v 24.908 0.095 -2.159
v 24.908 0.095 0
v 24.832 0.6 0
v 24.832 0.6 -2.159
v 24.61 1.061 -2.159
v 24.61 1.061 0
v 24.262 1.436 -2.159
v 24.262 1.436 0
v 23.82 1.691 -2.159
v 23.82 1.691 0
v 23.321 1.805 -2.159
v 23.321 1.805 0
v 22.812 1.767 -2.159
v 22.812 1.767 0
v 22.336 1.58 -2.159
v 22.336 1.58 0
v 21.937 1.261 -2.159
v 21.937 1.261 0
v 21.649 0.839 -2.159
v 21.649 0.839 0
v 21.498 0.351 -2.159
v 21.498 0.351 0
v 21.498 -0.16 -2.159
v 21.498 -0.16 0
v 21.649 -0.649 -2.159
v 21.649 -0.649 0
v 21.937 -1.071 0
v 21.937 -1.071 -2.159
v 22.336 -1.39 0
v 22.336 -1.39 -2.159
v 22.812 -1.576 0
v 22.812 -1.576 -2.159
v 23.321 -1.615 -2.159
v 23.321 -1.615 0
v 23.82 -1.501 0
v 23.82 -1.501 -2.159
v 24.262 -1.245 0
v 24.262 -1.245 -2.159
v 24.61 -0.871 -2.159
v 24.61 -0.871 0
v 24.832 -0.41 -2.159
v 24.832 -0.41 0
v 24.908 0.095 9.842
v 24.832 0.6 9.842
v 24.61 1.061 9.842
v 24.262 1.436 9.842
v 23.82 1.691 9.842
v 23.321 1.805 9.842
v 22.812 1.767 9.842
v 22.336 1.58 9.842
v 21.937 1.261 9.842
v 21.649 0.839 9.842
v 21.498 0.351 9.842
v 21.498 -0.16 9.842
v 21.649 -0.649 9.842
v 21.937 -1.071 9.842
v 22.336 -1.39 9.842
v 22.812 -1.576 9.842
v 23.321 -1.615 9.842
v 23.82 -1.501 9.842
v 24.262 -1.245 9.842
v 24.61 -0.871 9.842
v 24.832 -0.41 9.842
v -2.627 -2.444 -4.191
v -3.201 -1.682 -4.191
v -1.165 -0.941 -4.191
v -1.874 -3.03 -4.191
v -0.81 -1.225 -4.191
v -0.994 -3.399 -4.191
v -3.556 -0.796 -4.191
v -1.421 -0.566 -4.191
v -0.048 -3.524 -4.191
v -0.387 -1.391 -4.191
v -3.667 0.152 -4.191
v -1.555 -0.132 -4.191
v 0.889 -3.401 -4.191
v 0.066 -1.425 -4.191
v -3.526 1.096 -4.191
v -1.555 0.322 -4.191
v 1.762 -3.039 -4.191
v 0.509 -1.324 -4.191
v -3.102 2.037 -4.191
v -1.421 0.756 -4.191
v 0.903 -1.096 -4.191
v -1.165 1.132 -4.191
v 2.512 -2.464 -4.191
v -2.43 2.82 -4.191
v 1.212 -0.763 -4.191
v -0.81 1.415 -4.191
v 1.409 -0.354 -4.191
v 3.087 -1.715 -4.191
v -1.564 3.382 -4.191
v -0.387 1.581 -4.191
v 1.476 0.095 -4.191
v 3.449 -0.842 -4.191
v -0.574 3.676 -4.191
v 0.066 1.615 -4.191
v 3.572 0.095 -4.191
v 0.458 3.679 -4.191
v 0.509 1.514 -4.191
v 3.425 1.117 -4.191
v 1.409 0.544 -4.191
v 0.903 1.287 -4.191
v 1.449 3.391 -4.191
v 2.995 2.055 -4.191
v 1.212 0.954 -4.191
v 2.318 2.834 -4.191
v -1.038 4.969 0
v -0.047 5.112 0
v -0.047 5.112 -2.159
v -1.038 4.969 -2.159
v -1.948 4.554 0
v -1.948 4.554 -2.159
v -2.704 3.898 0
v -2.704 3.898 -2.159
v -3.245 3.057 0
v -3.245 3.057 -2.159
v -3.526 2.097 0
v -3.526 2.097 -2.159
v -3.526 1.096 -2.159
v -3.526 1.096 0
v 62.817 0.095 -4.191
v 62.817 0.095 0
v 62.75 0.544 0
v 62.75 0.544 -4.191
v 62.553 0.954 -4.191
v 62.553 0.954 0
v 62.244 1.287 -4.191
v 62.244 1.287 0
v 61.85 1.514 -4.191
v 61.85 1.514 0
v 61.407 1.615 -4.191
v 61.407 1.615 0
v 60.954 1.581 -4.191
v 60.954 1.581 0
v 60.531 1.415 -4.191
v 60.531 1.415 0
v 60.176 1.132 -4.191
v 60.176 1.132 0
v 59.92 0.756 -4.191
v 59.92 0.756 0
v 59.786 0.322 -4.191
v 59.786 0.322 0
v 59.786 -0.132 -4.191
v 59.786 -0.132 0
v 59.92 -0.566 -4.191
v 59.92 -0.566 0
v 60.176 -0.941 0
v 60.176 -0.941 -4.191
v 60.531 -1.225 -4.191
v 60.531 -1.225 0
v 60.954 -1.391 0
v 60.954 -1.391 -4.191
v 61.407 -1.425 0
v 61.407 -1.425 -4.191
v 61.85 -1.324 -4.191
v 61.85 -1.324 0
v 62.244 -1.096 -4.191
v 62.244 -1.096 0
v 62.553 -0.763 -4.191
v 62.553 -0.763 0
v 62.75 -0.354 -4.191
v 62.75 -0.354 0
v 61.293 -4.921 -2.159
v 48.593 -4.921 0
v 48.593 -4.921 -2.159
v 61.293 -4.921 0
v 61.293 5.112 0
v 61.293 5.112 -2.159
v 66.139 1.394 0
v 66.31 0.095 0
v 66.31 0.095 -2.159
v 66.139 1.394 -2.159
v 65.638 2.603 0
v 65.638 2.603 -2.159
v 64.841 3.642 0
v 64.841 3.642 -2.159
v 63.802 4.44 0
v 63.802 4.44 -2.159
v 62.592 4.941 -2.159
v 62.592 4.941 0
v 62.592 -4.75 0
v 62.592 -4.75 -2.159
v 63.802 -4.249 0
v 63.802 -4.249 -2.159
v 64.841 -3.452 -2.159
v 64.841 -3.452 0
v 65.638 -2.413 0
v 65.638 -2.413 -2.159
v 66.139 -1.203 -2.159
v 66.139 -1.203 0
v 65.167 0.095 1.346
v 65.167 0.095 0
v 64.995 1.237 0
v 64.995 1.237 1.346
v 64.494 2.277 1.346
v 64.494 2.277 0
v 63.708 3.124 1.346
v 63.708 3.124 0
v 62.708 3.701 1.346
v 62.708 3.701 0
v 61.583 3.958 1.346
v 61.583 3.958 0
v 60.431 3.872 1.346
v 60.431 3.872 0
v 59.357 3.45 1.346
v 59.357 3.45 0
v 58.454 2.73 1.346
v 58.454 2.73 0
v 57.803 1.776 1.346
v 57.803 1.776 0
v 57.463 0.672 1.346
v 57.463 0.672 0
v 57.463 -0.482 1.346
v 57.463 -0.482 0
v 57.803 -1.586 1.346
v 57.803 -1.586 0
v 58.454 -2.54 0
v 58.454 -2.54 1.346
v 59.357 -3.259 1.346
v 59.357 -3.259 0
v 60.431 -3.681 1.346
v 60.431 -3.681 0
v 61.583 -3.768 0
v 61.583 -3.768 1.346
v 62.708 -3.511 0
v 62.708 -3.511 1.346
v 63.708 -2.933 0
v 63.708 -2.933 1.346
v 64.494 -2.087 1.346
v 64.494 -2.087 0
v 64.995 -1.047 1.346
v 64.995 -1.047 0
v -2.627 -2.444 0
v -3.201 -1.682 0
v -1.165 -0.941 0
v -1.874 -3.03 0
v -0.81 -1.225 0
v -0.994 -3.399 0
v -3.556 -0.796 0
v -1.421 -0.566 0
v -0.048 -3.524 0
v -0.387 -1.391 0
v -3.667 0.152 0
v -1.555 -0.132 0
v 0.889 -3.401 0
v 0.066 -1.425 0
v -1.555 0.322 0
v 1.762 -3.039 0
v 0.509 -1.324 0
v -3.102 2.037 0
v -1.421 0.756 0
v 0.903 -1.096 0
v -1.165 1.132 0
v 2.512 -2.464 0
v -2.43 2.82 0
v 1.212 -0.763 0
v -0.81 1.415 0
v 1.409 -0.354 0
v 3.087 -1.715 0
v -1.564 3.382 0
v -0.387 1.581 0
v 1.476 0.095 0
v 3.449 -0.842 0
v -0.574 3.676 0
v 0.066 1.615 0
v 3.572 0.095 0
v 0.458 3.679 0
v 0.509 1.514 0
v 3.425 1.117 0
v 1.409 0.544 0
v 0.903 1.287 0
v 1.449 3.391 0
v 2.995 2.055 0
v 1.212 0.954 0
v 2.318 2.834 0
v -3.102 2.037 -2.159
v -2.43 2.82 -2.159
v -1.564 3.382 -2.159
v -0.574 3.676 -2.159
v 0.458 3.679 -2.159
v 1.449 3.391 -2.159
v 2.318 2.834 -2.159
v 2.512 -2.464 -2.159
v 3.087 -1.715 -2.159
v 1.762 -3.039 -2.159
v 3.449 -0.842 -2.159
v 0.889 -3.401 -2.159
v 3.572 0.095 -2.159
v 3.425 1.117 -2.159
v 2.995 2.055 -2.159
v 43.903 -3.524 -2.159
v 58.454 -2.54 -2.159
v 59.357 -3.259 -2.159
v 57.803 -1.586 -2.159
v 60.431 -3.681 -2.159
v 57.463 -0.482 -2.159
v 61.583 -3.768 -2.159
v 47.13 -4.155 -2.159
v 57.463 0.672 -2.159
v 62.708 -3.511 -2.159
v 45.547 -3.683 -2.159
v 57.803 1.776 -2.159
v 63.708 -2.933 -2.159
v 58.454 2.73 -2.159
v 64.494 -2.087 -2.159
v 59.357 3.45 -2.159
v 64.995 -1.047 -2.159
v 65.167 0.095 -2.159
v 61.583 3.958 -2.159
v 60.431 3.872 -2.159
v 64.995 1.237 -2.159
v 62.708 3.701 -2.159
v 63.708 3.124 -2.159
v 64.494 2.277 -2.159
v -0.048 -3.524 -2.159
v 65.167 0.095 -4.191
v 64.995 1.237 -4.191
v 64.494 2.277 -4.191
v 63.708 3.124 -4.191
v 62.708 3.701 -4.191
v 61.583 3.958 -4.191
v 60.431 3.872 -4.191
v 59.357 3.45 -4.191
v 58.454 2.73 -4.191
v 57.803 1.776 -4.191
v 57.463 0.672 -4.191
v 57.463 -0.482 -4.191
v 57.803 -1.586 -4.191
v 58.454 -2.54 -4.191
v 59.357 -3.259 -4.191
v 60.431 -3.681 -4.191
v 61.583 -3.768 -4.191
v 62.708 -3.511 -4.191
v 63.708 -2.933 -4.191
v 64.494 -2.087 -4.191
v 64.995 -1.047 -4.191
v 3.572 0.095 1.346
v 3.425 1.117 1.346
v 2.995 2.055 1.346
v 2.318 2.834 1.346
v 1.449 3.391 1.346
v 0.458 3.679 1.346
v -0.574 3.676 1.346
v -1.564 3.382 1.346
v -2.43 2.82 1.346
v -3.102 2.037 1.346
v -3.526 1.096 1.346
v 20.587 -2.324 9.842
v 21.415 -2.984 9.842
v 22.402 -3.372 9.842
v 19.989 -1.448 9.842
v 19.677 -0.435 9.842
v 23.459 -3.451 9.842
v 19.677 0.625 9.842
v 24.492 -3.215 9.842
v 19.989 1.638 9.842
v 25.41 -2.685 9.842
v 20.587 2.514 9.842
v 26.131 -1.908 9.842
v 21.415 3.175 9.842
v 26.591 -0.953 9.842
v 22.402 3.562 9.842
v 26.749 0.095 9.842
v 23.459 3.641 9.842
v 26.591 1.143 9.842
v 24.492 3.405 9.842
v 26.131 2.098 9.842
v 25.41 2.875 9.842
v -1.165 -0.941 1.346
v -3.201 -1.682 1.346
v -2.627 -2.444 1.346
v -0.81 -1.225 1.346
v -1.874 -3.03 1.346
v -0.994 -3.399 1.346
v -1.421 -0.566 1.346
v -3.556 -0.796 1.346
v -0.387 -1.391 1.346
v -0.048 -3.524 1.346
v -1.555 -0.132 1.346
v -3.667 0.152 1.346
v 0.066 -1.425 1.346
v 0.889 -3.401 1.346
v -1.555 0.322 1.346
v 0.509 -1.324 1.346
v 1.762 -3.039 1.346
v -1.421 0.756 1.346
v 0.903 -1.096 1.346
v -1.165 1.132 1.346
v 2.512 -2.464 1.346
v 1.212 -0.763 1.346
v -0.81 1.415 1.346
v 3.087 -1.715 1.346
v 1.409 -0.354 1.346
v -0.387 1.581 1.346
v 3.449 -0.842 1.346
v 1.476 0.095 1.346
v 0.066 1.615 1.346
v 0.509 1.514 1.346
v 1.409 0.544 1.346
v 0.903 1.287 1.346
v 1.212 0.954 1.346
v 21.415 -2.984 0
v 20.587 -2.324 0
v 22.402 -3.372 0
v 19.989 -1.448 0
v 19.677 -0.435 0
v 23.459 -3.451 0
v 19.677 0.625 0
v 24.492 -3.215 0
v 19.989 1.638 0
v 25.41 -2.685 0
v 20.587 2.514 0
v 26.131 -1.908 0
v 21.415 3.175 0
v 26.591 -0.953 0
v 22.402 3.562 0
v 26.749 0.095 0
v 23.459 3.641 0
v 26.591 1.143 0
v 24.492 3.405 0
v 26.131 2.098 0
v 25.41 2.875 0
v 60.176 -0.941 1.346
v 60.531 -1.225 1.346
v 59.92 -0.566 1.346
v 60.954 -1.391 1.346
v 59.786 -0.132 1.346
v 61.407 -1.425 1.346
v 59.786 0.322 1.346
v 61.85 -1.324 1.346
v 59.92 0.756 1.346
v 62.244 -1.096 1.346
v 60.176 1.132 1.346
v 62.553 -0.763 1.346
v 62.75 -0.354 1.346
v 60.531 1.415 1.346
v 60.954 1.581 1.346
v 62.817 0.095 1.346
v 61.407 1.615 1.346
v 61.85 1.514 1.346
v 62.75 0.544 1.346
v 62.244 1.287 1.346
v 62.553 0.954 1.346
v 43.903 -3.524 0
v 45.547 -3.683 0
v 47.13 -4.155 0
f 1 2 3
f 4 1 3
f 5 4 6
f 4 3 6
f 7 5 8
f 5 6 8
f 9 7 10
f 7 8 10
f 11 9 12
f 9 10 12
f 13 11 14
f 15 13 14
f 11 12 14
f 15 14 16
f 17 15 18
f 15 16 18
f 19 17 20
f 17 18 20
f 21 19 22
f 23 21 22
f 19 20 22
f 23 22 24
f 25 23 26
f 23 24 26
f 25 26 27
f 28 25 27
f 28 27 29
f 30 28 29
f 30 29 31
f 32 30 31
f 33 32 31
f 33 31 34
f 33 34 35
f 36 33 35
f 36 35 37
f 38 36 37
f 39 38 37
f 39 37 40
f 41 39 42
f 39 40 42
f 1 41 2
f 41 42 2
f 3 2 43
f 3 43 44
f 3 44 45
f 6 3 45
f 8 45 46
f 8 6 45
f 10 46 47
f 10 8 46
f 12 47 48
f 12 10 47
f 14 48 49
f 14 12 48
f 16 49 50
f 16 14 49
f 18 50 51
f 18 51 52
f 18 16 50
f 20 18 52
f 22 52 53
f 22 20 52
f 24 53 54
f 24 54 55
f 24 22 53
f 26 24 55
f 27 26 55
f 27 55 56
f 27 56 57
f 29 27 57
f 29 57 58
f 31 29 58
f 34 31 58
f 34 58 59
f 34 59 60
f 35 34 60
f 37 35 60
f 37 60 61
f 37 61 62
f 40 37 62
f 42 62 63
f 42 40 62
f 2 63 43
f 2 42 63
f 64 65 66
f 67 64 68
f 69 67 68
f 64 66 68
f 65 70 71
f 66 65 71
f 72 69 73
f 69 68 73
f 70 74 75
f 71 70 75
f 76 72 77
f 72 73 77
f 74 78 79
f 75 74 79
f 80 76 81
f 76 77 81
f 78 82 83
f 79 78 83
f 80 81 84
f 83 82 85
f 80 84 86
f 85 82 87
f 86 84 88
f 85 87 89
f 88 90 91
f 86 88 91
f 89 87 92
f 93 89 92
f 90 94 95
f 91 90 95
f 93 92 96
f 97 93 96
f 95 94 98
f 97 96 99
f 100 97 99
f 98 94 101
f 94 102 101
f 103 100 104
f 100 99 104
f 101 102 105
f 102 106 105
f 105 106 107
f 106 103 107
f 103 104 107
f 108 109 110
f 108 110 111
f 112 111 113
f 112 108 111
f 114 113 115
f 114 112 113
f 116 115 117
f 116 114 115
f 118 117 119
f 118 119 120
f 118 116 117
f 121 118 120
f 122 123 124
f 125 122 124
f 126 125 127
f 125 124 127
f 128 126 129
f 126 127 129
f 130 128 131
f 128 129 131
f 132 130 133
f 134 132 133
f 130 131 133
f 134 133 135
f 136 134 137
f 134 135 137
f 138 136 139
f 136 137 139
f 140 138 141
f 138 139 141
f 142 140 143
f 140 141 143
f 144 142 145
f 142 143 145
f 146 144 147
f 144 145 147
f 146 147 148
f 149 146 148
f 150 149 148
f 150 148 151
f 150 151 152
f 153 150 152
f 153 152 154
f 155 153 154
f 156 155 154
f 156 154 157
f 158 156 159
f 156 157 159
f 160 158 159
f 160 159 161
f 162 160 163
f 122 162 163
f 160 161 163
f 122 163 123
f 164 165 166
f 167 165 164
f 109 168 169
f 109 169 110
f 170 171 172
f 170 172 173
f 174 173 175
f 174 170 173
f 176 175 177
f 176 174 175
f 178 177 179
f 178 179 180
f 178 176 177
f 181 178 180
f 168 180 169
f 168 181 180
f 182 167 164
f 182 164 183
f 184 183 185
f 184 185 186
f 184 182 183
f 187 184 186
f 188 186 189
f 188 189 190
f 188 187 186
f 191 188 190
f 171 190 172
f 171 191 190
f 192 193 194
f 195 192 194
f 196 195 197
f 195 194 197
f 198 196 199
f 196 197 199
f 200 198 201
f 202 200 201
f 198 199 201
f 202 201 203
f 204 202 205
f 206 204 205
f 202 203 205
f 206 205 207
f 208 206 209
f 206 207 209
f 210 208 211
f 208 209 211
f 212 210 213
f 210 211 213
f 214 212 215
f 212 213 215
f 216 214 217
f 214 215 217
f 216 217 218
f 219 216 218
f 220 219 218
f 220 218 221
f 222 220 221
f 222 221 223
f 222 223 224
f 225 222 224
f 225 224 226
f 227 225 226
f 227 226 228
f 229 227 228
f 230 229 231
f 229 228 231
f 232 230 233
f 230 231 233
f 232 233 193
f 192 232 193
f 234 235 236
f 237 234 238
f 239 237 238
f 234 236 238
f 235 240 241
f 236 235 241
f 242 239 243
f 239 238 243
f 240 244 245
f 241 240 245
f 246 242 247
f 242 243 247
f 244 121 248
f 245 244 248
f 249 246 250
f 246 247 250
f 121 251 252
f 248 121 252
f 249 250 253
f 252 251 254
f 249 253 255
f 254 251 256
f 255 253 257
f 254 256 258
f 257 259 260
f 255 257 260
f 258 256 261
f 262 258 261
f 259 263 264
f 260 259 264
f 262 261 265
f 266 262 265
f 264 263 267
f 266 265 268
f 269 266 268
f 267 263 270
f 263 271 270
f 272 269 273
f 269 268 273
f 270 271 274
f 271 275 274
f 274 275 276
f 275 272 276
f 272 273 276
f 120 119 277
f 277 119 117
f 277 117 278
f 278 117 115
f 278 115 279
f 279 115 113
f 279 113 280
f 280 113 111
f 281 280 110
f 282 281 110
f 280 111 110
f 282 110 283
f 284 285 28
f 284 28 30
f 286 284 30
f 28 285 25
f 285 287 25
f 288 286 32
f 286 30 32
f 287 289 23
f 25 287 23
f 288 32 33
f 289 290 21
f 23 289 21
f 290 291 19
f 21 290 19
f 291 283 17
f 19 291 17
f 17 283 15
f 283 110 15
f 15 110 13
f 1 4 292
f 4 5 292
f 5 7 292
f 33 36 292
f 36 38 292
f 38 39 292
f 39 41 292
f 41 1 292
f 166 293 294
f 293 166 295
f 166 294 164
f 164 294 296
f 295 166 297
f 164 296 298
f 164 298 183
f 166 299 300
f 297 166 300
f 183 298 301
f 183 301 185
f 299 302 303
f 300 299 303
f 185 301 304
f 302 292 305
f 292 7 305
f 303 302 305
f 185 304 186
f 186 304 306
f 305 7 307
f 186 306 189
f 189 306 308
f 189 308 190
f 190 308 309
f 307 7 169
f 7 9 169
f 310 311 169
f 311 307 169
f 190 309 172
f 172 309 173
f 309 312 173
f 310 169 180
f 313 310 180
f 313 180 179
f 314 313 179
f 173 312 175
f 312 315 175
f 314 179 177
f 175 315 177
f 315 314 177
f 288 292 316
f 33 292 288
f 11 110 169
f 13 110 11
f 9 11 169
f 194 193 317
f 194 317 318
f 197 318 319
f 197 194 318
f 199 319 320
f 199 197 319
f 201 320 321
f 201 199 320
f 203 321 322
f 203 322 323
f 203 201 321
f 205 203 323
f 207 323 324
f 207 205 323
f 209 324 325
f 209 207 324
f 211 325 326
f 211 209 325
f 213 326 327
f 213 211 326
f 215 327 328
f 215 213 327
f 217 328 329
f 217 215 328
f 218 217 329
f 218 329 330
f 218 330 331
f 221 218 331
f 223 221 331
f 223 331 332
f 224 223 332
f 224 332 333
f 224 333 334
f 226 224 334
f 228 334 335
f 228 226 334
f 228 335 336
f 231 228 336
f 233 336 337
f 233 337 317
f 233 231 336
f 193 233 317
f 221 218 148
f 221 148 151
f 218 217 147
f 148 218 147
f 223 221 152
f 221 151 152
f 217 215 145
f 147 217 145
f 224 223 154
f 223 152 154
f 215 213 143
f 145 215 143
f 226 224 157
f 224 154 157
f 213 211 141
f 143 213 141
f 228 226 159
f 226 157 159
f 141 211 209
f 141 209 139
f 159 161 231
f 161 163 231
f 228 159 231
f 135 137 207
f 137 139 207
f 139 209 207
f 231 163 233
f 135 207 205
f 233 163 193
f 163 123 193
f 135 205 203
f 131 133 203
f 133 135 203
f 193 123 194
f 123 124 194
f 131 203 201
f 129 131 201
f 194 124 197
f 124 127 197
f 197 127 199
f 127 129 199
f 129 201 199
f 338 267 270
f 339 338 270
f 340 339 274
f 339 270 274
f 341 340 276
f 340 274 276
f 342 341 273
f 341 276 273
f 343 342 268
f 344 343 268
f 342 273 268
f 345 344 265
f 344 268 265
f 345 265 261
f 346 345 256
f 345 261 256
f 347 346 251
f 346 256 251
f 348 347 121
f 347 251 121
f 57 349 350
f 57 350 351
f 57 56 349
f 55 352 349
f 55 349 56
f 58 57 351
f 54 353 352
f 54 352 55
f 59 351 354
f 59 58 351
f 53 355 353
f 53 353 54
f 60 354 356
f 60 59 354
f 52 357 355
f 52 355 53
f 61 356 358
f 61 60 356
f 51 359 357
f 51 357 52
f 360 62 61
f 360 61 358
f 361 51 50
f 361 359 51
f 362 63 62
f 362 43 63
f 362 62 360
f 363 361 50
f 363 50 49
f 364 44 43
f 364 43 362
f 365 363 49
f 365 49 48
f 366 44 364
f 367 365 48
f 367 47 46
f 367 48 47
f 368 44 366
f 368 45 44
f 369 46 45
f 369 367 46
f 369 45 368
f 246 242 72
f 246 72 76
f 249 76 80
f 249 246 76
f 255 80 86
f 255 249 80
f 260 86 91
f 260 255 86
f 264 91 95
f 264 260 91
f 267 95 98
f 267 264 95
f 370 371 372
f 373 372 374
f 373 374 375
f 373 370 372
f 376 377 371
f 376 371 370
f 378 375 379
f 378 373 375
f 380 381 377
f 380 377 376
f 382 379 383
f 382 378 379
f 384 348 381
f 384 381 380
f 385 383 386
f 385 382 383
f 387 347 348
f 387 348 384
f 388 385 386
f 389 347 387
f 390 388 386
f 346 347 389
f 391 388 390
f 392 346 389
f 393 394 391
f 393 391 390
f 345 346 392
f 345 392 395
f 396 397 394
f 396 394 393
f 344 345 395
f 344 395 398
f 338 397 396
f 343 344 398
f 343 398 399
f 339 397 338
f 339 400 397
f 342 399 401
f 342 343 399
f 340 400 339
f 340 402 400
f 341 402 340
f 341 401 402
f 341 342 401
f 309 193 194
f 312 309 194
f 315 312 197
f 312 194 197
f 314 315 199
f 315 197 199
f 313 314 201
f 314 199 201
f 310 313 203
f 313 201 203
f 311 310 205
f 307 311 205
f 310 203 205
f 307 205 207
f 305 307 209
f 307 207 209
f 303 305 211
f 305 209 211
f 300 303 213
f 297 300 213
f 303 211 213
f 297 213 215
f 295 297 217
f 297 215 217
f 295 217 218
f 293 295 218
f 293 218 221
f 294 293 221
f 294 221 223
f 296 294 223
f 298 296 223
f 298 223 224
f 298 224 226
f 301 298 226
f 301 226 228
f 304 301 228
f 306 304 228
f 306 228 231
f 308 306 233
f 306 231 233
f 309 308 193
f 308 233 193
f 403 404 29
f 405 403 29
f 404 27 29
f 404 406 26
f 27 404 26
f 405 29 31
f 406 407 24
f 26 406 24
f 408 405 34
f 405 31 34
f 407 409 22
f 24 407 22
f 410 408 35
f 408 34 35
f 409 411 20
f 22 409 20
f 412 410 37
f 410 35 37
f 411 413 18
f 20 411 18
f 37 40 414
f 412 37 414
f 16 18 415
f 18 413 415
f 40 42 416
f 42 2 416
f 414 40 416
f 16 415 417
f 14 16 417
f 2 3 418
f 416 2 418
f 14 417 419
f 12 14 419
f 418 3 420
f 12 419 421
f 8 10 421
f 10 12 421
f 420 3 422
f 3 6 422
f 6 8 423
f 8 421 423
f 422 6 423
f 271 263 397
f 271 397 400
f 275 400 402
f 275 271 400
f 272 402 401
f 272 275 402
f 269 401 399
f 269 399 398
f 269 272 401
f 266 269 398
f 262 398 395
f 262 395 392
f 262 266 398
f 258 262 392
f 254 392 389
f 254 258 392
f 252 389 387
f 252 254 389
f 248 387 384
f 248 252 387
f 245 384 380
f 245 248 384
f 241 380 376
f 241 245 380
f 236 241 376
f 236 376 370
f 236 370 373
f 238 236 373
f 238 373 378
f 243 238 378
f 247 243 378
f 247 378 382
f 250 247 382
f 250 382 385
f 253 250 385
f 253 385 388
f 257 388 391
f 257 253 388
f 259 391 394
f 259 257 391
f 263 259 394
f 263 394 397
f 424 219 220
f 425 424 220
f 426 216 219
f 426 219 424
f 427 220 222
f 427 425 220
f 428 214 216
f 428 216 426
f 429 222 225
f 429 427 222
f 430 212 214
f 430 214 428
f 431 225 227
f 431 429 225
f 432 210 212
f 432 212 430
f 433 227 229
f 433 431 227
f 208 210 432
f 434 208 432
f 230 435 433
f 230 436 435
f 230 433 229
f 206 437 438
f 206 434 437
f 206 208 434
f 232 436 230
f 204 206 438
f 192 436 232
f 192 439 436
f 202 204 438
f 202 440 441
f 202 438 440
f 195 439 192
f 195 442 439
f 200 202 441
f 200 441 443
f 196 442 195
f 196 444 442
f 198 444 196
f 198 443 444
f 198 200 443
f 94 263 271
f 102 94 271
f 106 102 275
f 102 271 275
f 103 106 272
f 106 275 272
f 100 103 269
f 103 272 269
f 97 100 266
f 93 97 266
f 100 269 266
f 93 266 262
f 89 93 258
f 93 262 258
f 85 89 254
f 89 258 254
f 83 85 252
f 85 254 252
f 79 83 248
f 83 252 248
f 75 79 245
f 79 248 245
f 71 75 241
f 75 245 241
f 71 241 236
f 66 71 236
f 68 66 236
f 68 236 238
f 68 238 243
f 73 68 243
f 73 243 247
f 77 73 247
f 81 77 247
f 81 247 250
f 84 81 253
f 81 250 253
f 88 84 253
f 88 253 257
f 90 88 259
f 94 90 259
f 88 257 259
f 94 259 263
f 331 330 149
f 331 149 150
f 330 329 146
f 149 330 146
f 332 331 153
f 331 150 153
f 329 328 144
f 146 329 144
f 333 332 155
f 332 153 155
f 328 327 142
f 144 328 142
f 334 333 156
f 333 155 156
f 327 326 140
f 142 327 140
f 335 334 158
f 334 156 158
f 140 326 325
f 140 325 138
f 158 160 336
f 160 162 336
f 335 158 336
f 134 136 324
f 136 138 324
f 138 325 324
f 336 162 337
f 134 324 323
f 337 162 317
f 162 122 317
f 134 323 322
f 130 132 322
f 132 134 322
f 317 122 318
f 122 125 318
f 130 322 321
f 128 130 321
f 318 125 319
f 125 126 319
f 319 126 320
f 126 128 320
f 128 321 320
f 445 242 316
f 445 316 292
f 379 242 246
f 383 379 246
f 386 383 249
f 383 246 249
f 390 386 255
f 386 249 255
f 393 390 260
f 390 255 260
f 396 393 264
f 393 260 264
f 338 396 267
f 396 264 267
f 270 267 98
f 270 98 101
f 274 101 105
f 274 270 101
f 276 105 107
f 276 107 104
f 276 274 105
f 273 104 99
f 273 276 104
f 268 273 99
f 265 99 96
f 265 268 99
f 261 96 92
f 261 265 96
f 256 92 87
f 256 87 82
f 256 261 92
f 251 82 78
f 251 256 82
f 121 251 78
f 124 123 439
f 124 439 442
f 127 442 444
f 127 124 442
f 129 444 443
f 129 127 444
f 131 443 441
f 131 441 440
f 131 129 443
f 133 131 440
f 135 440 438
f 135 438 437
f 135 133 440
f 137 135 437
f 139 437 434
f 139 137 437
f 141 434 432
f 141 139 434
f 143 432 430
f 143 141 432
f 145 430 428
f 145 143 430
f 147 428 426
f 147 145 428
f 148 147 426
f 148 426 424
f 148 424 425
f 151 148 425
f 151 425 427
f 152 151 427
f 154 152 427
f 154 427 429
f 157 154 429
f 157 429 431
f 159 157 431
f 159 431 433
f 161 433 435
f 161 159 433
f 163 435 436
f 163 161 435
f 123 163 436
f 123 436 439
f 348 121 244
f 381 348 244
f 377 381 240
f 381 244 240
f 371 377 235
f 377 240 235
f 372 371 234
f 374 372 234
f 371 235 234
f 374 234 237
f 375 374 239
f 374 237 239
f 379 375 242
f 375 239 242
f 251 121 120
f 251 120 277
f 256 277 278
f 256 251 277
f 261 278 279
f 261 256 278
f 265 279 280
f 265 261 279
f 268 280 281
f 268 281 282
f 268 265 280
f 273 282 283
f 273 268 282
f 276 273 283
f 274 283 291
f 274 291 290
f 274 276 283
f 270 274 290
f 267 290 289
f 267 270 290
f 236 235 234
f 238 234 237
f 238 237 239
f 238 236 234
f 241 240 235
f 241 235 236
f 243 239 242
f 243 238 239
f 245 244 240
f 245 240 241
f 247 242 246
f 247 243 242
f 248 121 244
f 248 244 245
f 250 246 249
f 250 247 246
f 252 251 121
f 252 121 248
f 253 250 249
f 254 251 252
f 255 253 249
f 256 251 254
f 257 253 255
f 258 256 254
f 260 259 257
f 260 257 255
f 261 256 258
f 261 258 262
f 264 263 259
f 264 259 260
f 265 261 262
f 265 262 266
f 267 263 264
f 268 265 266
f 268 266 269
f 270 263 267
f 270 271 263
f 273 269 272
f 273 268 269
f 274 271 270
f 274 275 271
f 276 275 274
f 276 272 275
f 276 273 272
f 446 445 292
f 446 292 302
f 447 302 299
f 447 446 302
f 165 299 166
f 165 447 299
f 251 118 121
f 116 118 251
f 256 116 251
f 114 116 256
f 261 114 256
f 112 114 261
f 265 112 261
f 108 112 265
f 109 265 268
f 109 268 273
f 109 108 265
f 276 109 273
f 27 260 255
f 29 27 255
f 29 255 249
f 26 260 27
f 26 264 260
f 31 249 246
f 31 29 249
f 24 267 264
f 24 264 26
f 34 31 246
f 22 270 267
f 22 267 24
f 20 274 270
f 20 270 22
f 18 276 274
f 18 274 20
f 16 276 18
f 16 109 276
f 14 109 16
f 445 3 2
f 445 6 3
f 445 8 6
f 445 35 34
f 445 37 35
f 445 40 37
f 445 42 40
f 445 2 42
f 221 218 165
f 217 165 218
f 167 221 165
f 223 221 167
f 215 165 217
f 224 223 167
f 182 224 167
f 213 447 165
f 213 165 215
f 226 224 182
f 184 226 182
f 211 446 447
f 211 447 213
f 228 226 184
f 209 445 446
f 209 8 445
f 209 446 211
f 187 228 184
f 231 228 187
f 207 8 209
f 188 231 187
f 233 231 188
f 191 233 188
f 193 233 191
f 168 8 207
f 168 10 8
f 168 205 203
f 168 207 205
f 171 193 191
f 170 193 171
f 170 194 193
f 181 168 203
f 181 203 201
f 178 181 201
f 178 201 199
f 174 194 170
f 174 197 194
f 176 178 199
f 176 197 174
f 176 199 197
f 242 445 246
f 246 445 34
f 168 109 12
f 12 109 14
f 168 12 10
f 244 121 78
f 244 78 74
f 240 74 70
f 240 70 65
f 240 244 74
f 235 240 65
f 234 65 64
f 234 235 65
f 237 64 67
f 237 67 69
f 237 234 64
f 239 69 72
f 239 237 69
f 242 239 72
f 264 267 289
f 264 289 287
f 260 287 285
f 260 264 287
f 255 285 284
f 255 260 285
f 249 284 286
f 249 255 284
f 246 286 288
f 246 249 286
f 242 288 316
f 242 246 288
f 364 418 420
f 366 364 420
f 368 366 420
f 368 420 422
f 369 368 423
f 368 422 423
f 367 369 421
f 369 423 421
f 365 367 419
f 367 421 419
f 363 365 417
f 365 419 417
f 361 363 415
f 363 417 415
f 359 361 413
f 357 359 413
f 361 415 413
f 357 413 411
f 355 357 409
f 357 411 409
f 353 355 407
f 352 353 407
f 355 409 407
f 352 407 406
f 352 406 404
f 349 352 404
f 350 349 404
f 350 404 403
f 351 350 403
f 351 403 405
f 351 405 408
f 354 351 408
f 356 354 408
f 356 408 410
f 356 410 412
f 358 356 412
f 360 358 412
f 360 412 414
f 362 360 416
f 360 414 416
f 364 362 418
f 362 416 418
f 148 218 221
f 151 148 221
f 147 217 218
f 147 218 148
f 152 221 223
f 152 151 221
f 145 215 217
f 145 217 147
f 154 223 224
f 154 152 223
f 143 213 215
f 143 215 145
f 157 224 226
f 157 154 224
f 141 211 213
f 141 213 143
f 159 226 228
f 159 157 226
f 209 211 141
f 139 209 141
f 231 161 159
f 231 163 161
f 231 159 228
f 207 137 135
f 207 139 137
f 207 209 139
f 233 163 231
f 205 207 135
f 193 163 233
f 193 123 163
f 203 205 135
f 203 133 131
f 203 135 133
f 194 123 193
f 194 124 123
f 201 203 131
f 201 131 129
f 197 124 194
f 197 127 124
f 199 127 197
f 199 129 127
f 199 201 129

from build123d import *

# Parameters (mm, degrees)
F0_R     = 1.524
F0_R_2   = 3.8735
F1_DEPTH = 1.3462
F0_R_3   = 3.556
F0_R_4   = 1.7145
F2_DEPTH = 9.8425
F3_DEPTH = 4.191
F4_DEPTH = 2.159


with BuildPart() as f1:
    # F0 (on Top) → F1 (new body)
    with BuildSketch(Plane.XY):
        with BuildLine():
            ThreePointArc((-0.047665, -3.524364), (2.511708, -2.464237), (3.571835, 0.095136))
            ThreePointArc((3.571835, 0.095136), (0.457741, 3.679177), (-3.526021, 1.096046))
            ThreePointArc((-3.526021, 1.096046), (-2.93934, -2.081787), (-0.047665, -3.524364))
        make_face()
        with Locations((-0.047665, 0.095136)):
            Circle(F0_R, mode=Mode.SUBTRACT)
        with Locations((61.293335, 0.095136)):
            Circle(F0_R_2)
        with Locations((61.293335, 0.095136)):
            Circle(F0_R, mode=Mode.SUBTRACT)
    extrude(amount=F1_DEPTH)


with BuildPart() as f2:
    # F0 (on Top) → F2 (new body)
    with BuildSketch(Plane.XY):
        with Locations((23.193335, 0.095136)):
            Circle(F0_R_3)
        with Locations((23.193335, 0.095136)):
            Circle(F0_R_4, mode=Mode.SUBTRACT)
    extrude(amount=F2_DEPTH)


with BuildPart() as f3:
    # F0 (on Top) → F3 (new body)
    with BuildSketch(Plane.XY):
        with BuildLine():
            ThreePointArc((-0.047665, -3.524364), (2.511708, -2.464237), (3.571835, 0.095136))
            ThreePointArc((3.571835, 0.095136), (0.457741, 3.679177), (-3.526021, 1.096046))
            ThreePointArc((-3.526021, 1.096046), (-2.93934, -2.081787), (-0.047665, -3.524364))
        make_face()
        with Locations((-0.047665, 0.095136)):
            Circle(F0_R, mode=Mode.SUBTRACT)
        with Locations((61.293335, 0.095136)):
            Circle(F0_R_2)
        with Locations((61.293335, 0.095136)):
            Circle(F0_R, mode=Mode.SUBTRACT)
    extrude(amount=-F3_DEPTH)


with BuildPart() as f4:
    # F0 (on Top) → F4 (new body)
    with BuildSketch(Plane.XY):
        with BuildLine():
            ThreePointArc((-3.526021, 1.096046), (0.457741, 3.679177), (3.571835, 0.095136))
            ThreePointArc((3.571835, 0.095136), (2.511708, -2.464237), (-0.047665, -3.524364))
            Line((-0.047665, -3.524364), (43.902924, -3.524364))
            ThreePointArc((43.902924, -3.524364), (46.349941, -3.881033), (48.593335, -4.921364))
            Line((48.593335, -4.921364), (61.293335, -4.921364))
            ThreePointArc((61.293335, -4.921364), (56.276835, 0.095136), (61.293335, 5.111636))
            Line((61.293335, 5.111636), (-0.047457, 5.111636))
            ThreePointArc((-0.047457, 5.111636), (-2.703835, 3.898289), (-3.526021, 1.096046))
        make_face()
        with Locations((23.193335, 0.095136)):
            Circle(F0_R_3, mode=Mode.SUBTRACT)
        with Locations((23.193335, 0.095136)):
            Circle(F0_R_3)
        with Locations((23.193335, 0.095136)):
            Circle(F0_R_4, mode=Mode.SUBTRACT)
        with BuildLine():
            ThreePointArc((66.309835, 0.095136), (64.840536, 3.642338), (61.293335, 5.111636))
            ThreePointArc((61.293335, 5.111636), (56.276835, 0.095136), (61.293335, -4.921364))
            ThreePointArc((61.293335, -4.921364), (64.840536, -3.452065), (66.309835, 0.095136))
        make_face()
        with Locations((61.293335, 0.095136)):
            Circle(F0_R_2, mode=Mode.SUBTRACT)
    extrude(amount=-F4_DEPTH)


solid = Compound([f1.part, f2.part, f3.part, f4.part])
